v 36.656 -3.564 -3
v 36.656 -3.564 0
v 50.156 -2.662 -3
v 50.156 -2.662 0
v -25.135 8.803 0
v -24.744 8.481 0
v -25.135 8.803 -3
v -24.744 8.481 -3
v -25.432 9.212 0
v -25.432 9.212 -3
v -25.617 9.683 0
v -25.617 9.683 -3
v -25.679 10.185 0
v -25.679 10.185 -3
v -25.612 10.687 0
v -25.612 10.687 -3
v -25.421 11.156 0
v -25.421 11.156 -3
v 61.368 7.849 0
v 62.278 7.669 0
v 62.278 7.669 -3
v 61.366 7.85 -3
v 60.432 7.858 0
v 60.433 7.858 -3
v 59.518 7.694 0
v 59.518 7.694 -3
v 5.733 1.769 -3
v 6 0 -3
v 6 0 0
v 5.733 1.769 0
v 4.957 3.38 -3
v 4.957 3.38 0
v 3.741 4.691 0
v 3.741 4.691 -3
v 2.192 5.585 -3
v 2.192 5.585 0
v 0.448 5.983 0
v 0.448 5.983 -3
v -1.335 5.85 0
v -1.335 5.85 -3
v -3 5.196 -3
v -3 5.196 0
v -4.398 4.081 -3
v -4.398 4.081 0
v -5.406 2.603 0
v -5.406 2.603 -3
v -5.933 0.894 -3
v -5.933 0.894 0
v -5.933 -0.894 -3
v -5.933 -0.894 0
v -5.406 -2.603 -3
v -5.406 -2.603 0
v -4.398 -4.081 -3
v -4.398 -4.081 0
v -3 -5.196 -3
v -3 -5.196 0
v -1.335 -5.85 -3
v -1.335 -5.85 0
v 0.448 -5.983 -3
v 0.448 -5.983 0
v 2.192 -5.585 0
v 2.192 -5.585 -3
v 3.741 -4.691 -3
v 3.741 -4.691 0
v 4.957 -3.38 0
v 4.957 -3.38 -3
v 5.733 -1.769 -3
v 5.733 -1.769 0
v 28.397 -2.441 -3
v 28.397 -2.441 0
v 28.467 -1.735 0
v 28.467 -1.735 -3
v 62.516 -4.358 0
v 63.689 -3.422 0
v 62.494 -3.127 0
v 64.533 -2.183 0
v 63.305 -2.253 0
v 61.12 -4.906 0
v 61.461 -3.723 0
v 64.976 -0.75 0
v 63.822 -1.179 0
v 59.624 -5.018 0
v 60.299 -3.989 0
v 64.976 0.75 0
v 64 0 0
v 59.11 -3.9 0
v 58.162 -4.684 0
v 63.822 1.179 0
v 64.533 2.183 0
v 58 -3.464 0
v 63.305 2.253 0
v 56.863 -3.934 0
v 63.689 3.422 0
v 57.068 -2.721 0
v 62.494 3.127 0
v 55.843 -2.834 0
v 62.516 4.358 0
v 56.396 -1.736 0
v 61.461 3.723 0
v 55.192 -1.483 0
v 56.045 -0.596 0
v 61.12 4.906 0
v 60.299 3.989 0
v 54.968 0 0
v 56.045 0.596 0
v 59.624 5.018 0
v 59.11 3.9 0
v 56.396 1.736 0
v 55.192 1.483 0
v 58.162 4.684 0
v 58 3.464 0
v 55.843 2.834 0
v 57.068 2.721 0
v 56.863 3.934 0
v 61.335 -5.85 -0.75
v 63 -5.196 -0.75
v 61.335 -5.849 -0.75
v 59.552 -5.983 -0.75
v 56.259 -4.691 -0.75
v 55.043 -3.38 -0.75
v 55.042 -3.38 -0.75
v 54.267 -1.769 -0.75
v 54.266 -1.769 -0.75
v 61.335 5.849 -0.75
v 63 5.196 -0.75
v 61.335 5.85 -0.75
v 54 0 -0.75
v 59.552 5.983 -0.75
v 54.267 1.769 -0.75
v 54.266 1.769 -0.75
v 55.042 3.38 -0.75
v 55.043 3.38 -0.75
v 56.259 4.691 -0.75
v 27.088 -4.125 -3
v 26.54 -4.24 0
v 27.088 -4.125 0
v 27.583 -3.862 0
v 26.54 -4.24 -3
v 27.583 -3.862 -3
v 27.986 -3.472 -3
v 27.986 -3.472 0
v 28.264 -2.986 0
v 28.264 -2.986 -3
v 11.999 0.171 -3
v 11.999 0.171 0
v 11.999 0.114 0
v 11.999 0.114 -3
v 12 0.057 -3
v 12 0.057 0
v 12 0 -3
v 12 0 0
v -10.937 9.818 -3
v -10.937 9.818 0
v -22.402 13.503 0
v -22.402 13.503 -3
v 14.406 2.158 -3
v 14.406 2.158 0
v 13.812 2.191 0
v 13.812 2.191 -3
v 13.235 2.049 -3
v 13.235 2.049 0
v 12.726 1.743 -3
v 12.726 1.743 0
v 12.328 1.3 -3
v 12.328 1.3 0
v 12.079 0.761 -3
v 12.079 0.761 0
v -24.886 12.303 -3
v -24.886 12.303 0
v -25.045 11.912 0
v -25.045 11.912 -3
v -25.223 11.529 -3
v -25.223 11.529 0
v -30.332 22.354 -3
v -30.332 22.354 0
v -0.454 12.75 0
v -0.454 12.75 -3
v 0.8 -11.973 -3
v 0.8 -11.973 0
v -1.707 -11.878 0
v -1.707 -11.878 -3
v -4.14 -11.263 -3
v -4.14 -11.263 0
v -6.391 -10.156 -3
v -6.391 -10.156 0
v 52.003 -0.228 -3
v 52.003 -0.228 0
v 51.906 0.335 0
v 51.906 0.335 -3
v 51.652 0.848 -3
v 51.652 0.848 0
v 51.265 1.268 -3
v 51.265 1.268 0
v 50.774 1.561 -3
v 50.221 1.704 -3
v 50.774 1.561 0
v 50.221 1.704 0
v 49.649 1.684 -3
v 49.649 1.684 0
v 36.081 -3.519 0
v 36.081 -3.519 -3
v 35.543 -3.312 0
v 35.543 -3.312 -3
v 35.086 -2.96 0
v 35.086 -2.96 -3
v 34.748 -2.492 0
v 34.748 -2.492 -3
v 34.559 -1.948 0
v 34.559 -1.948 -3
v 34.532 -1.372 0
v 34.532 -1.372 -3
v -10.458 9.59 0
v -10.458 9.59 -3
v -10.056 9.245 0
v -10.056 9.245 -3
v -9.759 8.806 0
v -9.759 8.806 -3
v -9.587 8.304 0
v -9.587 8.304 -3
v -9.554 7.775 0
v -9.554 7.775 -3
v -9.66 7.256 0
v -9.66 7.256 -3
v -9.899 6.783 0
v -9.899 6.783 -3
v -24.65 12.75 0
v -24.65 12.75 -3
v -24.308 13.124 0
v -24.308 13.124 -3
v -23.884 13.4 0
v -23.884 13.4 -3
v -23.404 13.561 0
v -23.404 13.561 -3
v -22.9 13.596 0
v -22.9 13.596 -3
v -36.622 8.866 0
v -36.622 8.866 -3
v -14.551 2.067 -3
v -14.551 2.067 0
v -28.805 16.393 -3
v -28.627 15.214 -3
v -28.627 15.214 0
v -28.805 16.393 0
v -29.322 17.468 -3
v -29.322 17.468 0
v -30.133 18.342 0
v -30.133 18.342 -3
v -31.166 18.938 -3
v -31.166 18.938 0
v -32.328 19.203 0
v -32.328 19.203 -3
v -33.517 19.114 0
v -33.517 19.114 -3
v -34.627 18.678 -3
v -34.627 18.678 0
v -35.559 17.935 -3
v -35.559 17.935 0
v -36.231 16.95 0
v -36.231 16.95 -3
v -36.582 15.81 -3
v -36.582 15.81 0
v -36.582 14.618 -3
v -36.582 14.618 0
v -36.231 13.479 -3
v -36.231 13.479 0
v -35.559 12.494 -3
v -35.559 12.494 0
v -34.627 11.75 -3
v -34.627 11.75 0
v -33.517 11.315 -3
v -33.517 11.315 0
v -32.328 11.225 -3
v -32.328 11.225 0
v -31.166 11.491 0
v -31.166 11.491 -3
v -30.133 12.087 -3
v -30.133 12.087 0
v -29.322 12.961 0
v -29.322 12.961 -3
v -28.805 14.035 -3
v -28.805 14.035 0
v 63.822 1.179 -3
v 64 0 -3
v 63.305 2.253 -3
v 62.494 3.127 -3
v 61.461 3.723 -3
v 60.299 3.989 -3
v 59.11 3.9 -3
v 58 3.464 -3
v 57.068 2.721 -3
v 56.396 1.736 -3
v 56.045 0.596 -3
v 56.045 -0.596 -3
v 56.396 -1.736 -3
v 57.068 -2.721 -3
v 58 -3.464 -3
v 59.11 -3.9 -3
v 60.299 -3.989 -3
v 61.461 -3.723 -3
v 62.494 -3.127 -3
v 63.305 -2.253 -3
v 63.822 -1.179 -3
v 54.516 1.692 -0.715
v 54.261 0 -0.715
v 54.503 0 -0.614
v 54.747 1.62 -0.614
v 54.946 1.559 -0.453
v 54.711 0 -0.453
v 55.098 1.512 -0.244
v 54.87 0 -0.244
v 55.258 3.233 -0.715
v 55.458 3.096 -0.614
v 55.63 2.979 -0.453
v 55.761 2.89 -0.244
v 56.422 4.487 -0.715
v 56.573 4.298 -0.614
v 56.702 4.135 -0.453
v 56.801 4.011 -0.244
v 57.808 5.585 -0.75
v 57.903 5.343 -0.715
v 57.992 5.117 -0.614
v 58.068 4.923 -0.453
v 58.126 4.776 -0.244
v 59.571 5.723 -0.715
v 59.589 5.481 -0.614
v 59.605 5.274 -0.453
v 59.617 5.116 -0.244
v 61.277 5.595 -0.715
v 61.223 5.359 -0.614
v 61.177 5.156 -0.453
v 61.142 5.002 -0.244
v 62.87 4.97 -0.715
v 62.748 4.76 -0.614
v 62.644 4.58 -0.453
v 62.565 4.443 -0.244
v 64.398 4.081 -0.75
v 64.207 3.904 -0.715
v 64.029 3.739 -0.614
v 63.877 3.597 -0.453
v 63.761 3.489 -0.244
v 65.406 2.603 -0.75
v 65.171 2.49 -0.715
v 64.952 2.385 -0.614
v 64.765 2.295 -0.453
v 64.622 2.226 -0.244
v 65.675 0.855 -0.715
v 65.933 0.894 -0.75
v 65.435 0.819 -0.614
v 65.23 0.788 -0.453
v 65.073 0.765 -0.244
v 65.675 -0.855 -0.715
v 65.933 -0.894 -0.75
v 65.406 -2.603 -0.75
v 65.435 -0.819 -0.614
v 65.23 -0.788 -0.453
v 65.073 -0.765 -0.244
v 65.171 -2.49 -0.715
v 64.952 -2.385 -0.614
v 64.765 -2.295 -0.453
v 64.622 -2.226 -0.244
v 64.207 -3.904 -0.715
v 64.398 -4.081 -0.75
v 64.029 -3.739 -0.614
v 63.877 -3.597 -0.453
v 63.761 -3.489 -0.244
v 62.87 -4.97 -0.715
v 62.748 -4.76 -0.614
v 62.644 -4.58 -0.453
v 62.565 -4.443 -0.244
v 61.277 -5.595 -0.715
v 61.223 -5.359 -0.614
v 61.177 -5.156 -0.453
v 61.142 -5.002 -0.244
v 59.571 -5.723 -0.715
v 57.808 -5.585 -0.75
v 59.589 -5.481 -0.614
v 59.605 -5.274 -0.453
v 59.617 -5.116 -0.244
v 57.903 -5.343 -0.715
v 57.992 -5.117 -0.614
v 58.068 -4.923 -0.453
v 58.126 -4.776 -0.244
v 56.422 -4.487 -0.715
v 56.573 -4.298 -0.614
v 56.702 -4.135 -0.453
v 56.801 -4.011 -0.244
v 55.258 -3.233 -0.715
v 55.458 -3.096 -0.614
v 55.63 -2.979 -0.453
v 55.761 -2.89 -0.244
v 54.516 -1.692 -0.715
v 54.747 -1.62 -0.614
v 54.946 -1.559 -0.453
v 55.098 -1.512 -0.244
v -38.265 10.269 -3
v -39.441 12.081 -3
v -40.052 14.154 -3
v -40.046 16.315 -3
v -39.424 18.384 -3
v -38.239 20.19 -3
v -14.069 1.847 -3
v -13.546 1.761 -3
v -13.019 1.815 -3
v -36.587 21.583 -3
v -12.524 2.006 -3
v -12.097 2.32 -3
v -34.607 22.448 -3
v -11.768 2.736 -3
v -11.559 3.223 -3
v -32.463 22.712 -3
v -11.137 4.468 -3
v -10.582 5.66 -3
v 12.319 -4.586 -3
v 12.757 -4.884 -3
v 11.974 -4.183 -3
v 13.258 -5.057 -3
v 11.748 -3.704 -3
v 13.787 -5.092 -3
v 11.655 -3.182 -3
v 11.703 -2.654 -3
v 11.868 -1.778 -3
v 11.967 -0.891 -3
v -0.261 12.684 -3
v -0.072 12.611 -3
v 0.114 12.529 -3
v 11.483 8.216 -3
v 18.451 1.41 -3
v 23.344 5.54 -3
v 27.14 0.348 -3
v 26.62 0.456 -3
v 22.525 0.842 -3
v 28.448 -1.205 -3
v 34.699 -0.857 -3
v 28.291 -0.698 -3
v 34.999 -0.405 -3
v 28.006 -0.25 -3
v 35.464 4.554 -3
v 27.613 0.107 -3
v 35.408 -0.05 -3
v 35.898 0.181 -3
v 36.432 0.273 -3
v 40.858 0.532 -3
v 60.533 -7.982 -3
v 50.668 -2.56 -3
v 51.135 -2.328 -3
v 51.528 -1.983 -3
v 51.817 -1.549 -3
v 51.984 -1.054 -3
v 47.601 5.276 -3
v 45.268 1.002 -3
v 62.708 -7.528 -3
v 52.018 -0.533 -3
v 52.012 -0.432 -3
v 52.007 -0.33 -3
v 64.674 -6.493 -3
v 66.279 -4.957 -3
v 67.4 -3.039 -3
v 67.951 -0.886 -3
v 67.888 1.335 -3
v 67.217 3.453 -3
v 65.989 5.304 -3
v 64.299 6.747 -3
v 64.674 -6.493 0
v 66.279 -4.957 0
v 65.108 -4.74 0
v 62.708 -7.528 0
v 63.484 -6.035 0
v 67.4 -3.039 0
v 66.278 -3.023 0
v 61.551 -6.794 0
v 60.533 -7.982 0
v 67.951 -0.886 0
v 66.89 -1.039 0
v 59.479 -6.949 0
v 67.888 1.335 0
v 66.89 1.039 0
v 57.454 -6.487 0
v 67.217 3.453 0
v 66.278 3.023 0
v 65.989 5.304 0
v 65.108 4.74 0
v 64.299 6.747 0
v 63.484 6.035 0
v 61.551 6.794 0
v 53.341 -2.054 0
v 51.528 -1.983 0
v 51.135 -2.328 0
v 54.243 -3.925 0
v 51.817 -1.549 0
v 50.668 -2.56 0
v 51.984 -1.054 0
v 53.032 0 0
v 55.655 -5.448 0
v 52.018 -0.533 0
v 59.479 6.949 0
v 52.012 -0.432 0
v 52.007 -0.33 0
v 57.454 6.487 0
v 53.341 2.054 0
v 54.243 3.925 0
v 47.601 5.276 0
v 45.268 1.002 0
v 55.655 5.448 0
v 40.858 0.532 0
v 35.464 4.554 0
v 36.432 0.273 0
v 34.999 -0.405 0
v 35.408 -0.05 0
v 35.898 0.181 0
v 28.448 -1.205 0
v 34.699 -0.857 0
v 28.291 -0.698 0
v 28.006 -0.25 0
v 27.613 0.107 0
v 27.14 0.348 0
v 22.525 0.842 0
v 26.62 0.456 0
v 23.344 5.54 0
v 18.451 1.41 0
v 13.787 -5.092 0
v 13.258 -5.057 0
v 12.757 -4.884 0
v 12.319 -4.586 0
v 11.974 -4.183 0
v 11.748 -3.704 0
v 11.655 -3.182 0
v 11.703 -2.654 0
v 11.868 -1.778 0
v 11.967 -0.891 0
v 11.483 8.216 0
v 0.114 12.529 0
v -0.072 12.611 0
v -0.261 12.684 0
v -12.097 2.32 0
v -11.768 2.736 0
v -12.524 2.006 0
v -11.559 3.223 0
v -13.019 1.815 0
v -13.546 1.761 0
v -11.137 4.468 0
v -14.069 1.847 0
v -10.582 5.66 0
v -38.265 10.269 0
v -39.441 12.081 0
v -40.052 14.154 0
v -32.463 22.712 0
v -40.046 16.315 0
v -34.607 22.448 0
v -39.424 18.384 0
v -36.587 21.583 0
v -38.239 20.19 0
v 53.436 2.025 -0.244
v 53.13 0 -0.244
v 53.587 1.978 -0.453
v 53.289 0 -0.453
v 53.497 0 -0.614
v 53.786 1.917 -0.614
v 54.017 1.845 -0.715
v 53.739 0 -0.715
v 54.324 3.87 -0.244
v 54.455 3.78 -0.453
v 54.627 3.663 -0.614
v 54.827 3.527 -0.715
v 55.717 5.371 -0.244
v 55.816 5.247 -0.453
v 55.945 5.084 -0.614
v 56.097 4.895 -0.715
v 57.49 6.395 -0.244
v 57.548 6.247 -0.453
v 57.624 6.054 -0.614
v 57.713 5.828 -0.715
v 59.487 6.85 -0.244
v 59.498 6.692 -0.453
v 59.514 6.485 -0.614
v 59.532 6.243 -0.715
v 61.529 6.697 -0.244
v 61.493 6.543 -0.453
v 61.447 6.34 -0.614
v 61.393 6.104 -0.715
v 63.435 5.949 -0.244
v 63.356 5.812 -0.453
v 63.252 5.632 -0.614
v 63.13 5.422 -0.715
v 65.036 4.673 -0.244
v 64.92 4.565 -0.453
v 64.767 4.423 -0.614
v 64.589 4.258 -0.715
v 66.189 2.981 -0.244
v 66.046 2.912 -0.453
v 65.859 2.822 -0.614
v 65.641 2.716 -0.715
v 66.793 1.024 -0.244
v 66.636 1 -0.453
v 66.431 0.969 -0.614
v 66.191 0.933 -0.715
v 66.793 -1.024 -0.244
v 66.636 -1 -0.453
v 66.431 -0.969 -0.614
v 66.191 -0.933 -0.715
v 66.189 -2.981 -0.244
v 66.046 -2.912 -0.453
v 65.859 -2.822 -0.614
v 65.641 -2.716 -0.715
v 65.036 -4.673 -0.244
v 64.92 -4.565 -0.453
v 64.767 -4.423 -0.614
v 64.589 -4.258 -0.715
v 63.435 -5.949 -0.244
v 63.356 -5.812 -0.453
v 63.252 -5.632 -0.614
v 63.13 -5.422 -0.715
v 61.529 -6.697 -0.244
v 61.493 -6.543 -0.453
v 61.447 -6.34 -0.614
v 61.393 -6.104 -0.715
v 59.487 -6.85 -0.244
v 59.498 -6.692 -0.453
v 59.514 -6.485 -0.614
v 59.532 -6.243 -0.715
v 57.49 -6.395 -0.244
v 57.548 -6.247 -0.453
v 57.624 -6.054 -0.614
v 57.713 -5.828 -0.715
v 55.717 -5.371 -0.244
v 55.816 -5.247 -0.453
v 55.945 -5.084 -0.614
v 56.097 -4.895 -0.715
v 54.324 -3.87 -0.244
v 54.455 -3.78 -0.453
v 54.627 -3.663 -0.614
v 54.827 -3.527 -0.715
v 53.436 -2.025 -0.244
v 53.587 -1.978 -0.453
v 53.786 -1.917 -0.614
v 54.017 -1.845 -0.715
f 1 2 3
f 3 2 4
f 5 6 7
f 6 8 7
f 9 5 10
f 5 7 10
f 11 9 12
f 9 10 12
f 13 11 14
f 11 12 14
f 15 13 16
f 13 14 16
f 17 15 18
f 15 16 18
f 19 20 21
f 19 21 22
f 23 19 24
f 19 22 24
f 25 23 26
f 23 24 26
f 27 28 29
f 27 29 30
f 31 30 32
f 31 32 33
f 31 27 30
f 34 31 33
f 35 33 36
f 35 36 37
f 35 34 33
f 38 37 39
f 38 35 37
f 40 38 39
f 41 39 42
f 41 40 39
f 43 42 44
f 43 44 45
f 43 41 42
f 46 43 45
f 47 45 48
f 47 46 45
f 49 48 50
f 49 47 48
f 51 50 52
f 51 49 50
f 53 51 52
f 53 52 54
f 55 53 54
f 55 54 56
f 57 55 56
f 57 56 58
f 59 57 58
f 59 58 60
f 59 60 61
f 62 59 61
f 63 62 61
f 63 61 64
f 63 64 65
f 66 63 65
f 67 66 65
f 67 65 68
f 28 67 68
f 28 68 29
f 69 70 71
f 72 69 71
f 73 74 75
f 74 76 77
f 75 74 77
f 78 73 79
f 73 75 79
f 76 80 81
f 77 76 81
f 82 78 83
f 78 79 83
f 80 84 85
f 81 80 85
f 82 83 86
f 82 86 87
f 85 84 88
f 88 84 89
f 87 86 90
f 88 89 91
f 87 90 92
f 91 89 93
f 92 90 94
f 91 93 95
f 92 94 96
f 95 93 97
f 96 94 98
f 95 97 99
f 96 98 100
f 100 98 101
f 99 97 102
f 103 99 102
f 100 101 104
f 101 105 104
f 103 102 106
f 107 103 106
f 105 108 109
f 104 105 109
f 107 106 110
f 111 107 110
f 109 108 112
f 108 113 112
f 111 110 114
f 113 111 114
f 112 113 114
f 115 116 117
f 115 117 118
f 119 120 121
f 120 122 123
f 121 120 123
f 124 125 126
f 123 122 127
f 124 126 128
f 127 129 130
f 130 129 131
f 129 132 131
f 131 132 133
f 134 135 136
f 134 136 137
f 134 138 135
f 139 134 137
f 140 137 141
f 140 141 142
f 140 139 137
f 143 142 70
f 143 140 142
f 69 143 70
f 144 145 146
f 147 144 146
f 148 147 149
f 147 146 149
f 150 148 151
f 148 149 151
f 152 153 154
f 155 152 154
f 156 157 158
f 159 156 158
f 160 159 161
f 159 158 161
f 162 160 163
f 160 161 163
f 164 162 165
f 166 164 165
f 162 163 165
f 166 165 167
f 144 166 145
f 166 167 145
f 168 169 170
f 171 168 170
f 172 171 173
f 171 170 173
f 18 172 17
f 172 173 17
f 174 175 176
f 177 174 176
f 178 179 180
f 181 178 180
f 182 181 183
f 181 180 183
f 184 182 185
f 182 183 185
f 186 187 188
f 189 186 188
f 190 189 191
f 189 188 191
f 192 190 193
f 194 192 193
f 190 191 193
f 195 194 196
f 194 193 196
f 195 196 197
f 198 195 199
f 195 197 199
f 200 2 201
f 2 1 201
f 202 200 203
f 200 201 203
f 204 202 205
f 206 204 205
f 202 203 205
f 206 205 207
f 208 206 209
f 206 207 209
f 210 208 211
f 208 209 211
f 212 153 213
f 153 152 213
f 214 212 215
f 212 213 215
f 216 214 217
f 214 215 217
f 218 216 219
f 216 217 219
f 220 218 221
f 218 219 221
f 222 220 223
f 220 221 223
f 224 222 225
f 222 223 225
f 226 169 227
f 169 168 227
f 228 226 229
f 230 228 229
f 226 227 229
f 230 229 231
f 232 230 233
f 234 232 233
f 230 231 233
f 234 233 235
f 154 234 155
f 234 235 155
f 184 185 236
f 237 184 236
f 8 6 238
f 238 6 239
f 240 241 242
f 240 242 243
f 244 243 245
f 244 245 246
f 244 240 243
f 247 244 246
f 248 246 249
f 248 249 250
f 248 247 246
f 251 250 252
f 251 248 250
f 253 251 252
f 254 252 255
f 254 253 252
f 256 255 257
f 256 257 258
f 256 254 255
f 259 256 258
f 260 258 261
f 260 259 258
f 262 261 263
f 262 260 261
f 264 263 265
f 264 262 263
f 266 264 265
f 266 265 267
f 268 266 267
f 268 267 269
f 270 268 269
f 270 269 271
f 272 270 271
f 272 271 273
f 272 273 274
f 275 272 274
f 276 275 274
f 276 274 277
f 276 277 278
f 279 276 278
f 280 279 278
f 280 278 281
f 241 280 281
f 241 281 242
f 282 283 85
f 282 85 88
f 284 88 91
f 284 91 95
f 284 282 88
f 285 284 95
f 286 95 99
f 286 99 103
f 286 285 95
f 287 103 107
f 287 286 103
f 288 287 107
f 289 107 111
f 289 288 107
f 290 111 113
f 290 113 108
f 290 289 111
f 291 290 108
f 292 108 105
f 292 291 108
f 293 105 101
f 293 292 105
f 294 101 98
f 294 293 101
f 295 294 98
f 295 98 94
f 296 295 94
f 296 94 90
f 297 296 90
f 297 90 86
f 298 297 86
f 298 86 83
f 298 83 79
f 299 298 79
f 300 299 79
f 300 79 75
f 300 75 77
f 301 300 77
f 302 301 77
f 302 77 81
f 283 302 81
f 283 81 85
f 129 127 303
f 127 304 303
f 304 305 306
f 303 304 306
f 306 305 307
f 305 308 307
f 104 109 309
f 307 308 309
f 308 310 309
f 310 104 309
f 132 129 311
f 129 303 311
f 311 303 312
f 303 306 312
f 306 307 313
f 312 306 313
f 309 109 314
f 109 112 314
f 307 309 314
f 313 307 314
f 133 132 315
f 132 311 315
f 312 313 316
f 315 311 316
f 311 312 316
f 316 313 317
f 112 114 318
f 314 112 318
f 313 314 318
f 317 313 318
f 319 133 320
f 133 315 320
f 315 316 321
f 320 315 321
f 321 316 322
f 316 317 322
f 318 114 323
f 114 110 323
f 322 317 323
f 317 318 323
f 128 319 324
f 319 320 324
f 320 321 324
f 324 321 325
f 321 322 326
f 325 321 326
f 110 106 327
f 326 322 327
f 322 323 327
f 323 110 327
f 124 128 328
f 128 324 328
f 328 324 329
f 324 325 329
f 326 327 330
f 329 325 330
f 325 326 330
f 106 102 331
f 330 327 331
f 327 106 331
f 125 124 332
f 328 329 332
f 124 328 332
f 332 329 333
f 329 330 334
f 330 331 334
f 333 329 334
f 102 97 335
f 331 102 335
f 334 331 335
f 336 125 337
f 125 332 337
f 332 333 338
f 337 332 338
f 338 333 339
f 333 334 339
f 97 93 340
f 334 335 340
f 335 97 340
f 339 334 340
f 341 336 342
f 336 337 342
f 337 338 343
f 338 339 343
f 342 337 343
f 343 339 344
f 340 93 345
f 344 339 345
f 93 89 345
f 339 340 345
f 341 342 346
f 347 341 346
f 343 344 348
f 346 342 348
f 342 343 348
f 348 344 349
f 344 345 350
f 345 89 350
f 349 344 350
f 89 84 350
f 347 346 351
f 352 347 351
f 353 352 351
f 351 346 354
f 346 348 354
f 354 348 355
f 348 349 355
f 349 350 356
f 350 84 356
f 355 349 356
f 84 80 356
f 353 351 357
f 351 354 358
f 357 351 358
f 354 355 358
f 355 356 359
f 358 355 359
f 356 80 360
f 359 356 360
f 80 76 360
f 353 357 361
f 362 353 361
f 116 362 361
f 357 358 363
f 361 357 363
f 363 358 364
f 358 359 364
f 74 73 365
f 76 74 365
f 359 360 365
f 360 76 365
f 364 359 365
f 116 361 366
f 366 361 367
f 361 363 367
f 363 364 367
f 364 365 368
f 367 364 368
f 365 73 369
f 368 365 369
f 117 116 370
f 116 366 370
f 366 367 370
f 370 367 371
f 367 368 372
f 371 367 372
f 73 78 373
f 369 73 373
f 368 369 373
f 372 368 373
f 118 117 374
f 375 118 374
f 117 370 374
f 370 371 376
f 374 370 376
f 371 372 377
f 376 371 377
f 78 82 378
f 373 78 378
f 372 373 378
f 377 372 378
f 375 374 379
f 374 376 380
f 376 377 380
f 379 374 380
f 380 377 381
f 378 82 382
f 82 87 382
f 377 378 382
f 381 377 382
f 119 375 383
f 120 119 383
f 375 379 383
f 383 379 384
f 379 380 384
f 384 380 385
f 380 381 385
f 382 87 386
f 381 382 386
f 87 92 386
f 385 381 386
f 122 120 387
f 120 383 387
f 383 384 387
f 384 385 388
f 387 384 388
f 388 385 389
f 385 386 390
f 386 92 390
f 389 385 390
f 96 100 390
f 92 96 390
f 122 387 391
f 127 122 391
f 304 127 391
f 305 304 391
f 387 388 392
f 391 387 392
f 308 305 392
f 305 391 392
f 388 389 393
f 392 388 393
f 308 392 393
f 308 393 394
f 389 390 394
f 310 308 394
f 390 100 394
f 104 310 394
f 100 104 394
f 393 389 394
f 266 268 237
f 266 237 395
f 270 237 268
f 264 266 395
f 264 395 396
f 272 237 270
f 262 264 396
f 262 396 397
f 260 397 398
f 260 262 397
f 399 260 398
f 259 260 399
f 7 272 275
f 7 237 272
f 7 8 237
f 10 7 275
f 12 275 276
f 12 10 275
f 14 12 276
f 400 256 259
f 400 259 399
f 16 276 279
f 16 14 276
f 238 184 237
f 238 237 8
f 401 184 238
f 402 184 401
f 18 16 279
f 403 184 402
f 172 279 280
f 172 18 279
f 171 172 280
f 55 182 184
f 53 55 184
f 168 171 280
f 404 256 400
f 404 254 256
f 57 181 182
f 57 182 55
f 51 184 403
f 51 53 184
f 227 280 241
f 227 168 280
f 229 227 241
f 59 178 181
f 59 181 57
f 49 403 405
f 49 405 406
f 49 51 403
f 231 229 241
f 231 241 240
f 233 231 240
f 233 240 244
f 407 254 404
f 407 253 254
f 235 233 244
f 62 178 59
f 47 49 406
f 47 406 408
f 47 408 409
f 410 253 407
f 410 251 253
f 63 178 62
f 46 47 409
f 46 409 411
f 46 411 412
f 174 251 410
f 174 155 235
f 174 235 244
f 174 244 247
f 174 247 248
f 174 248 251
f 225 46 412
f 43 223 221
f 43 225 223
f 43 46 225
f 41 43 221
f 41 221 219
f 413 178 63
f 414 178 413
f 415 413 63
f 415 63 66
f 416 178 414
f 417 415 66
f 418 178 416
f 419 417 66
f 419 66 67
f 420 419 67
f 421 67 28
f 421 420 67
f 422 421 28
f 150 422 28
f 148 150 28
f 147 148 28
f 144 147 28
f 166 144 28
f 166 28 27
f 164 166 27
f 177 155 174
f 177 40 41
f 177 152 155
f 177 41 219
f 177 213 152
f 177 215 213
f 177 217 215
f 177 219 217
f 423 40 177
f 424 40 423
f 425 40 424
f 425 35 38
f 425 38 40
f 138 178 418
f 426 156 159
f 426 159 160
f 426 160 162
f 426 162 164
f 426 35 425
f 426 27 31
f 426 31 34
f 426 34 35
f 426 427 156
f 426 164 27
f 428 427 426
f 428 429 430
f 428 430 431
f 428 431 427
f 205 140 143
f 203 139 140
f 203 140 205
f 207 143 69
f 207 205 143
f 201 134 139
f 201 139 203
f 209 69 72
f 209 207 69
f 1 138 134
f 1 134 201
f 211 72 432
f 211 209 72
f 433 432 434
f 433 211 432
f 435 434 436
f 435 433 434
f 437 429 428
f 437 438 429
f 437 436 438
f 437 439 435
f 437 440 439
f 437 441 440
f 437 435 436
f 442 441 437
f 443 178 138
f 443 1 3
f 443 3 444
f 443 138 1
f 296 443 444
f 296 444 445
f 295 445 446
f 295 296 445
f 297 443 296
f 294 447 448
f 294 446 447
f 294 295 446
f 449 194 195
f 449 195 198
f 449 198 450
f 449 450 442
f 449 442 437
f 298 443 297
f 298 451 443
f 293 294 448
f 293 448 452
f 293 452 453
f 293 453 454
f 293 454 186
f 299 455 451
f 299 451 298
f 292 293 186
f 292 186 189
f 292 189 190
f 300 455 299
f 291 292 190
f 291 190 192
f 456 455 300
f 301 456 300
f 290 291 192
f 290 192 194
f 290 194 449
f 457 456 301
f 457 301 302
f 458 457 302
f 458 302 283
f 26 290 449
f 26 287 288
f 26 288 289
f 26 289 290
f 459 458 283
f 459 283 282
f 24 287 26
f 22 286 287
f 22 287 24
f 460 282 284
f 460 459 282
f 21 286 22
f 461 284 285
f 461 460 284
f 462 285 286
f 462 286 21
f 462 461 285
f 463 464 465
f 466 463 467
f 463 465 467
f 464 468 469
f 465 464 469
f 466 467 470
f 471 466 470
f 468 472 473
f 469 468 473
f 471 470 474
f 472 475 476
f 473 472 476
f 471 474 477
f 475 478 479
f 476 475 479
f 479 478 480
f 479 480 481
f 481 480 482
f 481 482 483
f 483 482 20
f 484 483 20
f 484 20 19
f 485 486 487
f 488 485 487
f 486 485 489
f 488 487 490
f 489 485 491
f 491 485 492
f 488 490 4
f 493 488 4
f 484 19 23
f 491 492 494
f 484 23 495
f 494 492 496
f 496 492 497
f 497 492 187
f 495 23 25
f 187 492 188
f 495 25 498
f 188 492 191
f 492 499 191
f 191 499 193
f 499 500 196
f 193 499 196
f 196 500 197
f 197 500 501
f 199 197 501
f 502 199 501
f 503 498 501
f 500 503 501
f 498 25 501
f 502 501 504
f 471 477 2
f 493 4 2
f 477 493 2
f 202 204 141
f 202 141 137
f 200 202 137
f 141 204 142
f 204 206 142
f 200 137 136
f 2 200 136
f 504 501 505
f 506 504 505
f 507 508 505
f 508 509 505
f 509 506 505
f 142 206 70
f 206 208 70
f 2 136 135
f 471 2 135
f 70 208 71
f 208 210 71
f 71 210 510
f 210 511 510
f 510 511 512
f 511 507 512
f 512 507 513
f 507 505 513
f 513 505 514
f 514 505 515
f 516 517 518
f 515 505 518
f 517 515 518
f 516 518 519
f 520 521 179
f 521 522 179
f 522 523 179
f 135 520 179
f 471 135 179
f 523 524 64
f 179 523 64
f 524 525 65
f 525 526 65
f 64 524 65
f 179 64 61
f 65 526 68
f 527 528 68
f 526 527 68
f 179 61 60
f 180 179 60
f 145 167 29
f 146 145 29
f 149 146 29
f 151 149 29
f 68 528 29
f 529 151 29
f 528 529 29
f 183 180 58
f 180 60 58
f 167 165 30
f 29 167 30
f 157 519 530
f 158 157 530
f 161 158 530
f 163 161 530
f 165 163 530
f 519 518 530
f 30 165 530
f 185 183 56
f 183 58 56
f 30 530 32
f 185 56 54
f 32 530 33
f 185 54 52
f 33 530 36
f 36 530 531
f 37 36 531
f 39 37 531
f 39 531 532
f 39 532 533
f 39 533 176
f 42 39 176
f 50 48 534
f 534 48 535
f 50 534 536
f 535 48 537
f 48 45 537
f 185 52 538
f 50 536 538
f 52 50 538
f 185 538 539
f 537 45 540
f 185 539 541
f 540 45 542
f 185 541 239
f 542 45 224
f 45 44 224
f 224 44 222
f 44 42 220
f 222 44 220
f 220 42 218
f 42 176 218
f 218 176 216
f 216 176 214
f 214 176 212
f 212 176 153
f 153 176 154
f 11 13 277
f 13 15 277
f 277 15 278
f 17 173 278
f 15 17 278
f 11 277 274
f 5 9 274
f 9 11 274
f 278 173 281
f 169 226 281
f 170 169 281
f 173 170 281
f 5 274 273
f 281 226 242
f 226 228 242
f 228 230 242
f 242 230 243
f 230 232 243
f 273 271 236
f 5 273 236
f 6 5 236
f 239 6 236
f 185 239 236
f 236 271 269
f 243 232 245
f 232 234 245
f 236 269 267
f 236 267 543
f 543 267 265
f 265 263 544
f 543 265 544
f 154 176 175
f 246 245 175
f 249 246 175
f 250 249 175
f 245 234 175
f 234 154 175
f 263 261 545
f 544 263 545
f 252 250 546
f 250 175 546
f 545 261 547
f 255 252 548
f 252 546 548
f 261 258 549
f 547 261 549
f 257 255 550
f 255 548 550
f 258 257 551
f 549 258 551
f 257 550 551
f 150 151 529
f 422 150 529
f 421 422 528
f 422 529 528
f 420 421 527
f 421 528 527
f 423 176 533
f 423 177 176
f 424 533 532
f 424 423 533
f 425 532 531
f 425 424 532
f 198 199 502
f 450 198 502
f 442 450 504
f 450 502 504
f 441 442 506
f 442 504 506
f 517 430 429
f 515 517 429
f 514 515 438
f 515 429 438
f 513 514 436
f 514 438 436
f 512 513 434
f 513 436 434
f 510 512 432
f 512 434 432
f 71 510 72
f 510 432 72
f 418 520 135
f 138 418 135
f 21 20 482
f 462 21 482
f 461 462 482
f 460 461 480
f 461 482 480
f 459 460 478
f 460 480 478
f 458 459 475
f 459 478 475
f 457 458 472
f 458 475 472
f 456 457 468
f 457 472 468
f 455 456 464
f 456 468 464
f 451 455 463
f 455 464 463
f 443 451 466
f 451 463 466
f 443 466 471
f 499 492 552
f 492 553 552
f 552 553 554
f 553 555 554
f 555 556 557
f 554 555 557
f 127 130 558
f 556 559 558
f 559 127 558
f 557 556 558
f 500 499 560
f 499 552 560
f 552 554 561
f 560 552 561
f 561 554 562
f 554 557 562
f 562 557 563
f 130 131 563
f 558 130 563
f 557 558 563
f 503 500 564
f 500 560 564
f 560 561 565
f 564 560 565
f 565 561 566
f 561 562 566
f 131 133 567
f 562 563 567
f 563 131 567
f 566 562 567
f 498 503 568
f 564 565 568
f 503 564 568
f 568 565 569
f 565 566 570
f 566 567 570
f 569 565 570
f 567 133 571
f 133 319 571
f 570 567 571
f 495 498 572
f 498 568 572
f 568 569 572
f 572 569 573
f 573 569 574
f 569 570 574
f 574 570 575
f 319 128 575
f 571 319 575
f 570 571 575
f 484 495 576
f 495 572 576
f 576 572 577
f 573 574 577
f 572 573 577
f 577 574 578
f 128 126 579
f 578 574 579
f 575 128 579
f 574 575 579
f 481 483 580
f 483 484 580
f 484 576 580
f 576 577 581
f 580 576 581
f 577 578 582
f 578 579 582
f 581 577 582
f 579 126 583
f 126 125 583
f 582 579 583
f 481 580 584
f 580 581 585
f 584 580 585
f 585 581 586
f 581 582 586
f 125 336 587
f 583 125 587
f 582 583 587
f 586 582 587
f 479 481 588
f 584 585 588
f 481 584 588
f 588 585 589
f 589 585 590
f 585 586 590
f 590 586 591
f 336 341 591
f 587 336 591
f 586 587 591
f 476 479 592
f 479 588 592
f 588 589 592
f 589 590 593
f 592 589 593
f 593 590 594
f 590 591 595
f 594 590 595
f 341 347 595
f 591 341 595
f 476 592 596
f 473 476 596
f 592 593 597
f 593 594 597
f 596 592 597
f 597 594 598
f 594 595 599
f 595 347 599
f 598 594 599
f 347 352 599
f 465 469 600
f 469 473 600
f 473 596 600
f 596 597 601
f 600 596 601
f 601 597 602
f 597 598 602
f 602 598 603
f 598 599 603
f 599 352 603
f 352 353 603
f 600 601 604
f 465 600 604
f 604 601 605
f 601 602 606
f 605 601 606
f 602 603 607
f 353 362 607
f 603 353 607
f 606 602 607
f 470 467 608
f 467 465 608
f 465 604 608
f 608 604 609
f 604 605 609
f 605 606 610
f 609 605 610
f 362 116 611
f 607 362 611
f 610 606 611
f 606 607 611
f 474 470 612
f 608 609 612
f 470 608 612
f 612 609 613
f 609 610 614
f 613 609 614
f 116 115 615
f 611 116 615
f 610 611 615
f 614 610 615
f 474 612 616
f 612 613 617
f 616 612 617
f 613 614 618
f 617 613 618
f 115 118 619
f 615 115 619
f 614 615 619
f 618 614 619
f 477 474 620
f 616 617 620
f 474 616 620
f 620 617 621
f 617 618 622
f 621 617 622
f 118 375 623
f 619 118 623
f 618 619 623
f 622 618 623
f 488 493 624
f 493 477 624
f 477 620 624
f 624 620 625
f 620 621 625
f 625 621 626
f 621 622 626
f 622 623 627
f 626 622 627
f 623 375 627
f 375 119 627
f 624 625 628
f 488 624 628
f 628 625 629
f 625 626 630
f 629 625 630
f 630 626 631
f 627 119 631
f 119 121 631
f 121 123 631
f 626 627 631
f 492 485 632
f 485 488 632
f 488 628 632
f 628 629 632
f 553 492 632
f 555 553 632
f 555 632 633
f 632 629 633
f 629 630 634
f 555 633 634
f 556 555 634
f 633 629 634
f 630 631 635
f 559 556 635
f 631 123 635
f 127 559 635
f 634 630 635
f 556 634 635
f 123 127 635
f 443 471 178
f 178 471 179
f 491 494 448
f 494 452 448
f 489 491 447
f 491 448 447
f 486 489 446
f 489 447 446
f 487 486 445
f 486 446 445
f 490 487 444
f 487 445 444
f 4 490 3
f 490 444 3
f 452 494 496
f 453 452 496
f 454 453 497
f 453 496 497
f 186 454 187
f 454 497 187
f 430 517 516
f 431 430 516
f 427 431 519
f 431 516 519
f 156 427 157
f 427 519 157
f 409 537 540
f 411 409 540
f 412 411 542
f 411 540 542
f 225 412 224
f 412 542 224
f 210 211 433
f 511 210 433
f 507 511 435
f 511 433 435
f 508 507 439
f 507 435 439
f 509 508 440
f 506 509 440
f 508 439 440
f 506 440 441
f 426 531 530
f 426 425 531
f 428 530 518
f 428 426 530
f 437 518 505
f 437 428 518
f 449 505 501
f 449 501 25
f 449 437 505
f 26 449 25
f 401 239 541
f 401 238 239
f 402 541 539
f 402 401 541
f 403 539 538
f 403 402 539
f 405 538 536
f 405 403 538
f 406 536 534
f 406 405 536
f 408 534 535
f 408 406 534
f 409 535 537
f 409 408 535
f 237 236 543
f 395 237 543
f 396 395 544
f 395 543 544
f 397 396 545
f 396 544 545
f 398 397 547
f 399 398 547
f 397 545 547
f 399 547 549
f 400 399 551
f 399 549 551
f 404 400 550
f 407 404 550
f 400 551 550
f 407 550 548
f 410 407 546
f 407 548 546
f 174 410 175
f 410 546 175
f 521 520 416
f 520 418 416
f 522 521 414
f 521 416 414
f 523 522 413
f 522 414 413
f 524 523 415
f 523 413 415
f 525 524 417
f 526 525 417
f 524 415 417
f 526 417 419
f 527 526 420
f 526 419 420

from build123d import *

# Parameters (mm, degrees)
EXTRUDE_1_DEPTH     = 3
SKETCH_2_R          = 4
SKETCH_2_R_2        = 6
CUT_EXTRUDE_1_DEPTH = 5
CUT_EXTRUDE_START   = -10
CUT_EXTRUDE_2_DEPTH = 10
FILLET_1_R          = 2
EXTRUDE_START       = -3
EXTRUDE_2_DEPTH     = 3
FILLET_3_R          = 2
EXTRUDE_START_2     = 0.25
SKETCH_6_R          = 8
EXTRUDE_3_DEPTH     = 0.25
SKETCH_7_R          = 7
SKETCH_7_R_2        = 5
CUT_EXTRUDE_4_DEPTH = 1
SKETCH_4_R          = 86.502313977
CUT_EXTRUDE_5_DEPTH = 11
FILLET_5_R          = 5
FILLET_6_R          = 1
SKETCH_8_R          = 14.07038583
CUT_EXTRUDE_6_DEPTH = 0.25


# Some blends are built 0.0001 mm under size
with BuildPart() as part:
    # 草图1 → 凸台-拉伸1 (new body)
    with BuildSketch(Plane.XY):
        with BuildLine():
            Line((60.533333333, -7.982202425), (0.8, -11.973303638))
            ThreePointArc((0.8, -11.973303638), (-2.939445104, -11.634417153), (-6.391104371, -10.156465178))
            Line((-6.391104371, -10.156465178), (-36.621520565, 8.866466686))
            ThreePointArc((-36.621520565, 8.866466686), (-39.424388736, 18.383894386), (-30.331967202, 22.3544574))
            Line((-30.331967202, 22.3544574), (-0.067539503, 12.626398572))
            ThreePointArc((-0.067539503, 12.626398572), (2.297970236, 12.022555106), (4.719428847, 11.711425782))
            Line((4.719428847, 11.711425782), (60.533333333, 7.982202425))
            ThreePointArc((60.533333333, 7.982202425), (68, 0), (60.533333333, -7.982202425))
        make_face()
    extrude(amount=EXTRUDE_1_DEPTH)

    # 草图2 → 切除-拉伸1 (cut)
    with BuildSketch(Plane.XY.offset(3)):
        with Locations((-32.627080333, 15.214257423)):
            Circle(SKETCH_2_R)
        with Locations((60, 0)):
            Circle(SKETCH_2_R)
        Circle(SKETCH_2_R_2)
    extrude(amount=-CUT_EXTRUDE_1_DEPTH, mode=Mode.SUBTRACT)

    # 草图3 → 切除-拉伸2 (cut)
    with BuildSketch(Plane.XY.offset(3).offset(CUT_EXTRUDE_START)):
        with BuildLine():
            Line((28.230392562, -4.127155499), (29.041000535, 4.072994476))
            Line((29.041000535, 4.072994476), (10.769185117, 5.293831496))
            ThreePointArc((10.769185117, 5.293831496), (11.688246691, 2.71751528), (12, 0))
            ThreePointArc((12, 0), (11.688246691, -2.71751528), (10.769185117, -5.293831496))
            Line((10.769185117, -5.293831496), (28.230392562, -4.127155499))
        make_face()
        with BuildLine():
            ThreePointArc((-11.991309043, 0.456626154), (-10.875693444, 5.071419141), (-8.057660805, 8.892362024))
            Line((-8.057660805, 8.892362024), (-24.425138032, 14.153448832))
            ThreePointArc((-24.425138032, 14.153448832), (-25.131680833, 11.719095235), (-26.54234692, 9.613079718))
            Line((-26.54234692, 9.613079718), (-11.991309043, 0.456626154))
        make_face()
        with BuildLine():
            Line((52.404599069, 2.511948386), (35.030683756, 3.672791932))
            Line((35.030683756, 3.672791932), (34.299724154, -3.721631224))
            Line((34.299724154, -3.721631224), (52.404599069, -2.511948386))
            ThreePointArc((52.404599069, -2.511948386), (52, 0), (52.404599069, 2.511948386))
        make_face()
    extrude(amount=CUT_EXTRUDE_2_DEPTH, mode=Mode.SUBTRACT)

    # 圆角1
    fillet_1_edges = [part.edges().sort_by_distance(p)[0] for p in [
        (52.404599069, 2.511948386, 1.5),
        (52.404599069, -2.511948386, 1.5),
        (34.299724154, -3.721631224, 1.5),
        (35.030683756, 3.672791932, 1.5),
        (-26.54234692, 9.613079718, 1.5),
        (-24.425138032, 14.153448832, 1.5),
        (-8.057660805, 8.892362024, 1.5),
        (-11.991309043, 0.456626154, 1.5),
        (10.769185117, -5.293831496, 1.5),
        (10.769185117, 5.293831496, 1.5),
        (29.041000535, 4.072994476, 1.5),
        (28.230392562, -4.127155499, 1.5),
    ]]
    fillet(fillet_1_edges, radius=FILLET_1_R)

    # 草图5 → 凸台-拉伸2 (add)
    with BuildSketch(Plane.XY.offset(3).offset(EXTRUDE_START)):
        with BuildLine():
            Line((-24.540394024, 20.492840682), (-0.067539503, 12.626398572))
            ThreePointArc((-0.067539503, 12.626398572), (29.515306686, 4.823317954), (59.944614351, 7.999808275))
            ThreePointArc((59.944614351, 7.999808275), (62.829825639, 7.482786036), (65.335143615, 5.96122828))
            ThreePointArc((65.335143615, 5.96122828), (18.485789408, 1.404205763), (-24.540394024, 20.492840682))
        make_face()
    extrude(amount=EXTRUDE_2_DEPTH)

    # 圆角3
    # the kernel refuses this fillet: 2 mm, written as the material it adds along each edge
    with BuildSketch(Plane(origin=(51.482720464, 2.033055033, 0), x_dir=(-0.982319810641478, -0.18721054890494518, 0), z_dir=(0, 0, 1))) as fillet_3_piece_1:
        with BuildLine():
            CenterArc((1.886422925, 1.999898233), FILLET_3_R, 170.841064361, 98.580936146)
            Line((-0.088078274, 2.318245549), (-0.285528394, 2.350080281))
            ThreePointArc((-0.285528394, 2.350080281), (-0.438383872, 1.623834826), (-0.169045436, -0.106881432))
            Line((-0.169045436, -0.106881432), (0.002017565, -0.199989823))
            ThreePointArc((0.002017565, -0.199989823), (0.933123639, -0.195293287), (1.864229714, -0.199989823))
            Line((1.864229714, -0.199989823), (1.866247279, 0))
        make_face()
    extrude(amount=3)
    with BuildSketch(Plane(origin=(34.690308342, 0.229537561, 3), x_dir=(-0.09837334507512366, -0.995149579198389, 0), z_dir=(0, 0, -1))) as fillet_3_piece_2:
        with BuildLine():
            CenterArc((1.767742063, -1.99371148), FILLET_3_R, 94.544757631, 77.838582335)
            Line((-0.214612021, -1.728622274), (-0.254259103, -1.72332049))
            ThreePointArc((-0.254259103, -1.72332049), (-0.142932142, -0.859888079), (-0.039739887, 0.004554272))
            Line((-0.039739887, 0.004554272), (0, 0.04))
            ThreePointArc((0, 0.04), (0.8046332, 0.04), (1.606096886, 0.03987423))
            Line((1.606096886, 0.03987423), (1.6092664, 0))
        make_face()
    extrude(amount=3)
    with BuildSketch(Plane(origin=(28.671165111, 0.331721205, 3), x_dir=(-0.9981625762582289, 0.060592667522857975, 0), z_dir=(0, 0, -1))) as fillet_3_piece_3:
        with BuildLine():
            CenterArc((2.077274931, -1.999876599), FILLET_3_R, 90.636478793, 91.535197335)
            Line((0.078711388, -2.075664247), (0.038740118, -2.07718))
            Line((0.038740118, -2.07718), (-0.039971271, -0.001515753))
            Line((-0.039971271, -0.001515753), (0.000444337, 0.039997532))
            ThreePointArc((0.000444337, 0.039997532), (1.027529043, 0.034292711), (2.05461375, 0.039997532))
            Line((2.05461375, 0.039997532), (2.055058086, 0))
        make_face()
    extrude(amount=3)
    with BuildSketch(Plane(origin=(11.680363127, 2.768333075, 0), x_dir=(0.12170231269855974, -0.9925666461673099, 0), z_dir=(0, 0, 1))) as fillet_3_piece_4:
        with BuildLine():
            CenterArc((2.831331682, 1.988408565), FILLET_3_R, 161.255131194, 102.573219996)
            Line((0.937413857, 2.631117886), (0.748022074, 2.695388818))
            ThreePointArc((0.748022074, 2.695388818), (0.290238781, 1.379143519), (-0.187364942, 0.069959836))
            Line((-0.187364942, 0.069959836), (0.008579816, -0.199815882))
            ThreePointArc((0.008579816, -0.199815882), (0.136091641, -0.190622784), (2.594815369, -0.198840857))
            Line((2.594815369, -0.198840857), (2.616316852, 0))
        make_face()
    extrude(amount=3)

    # 草图6 → 凸台-拉伸3 (add)
    with BuildSketch(Plane(origin=(0, 0, 0), x_dir=(-1, 0, 0), z_dir=(0, 0, -1)).offset(EXTRUDE_START_2)):
        with Locations((-60, 0)):
            Circle(SKETCH_6_R)
    extrude(amount=-EXTRUDE_3_DEPTH)

    # 草图7 → 切除-拉伸4 (cut)
    with BuildSketch(Plane(origin=(0, 0, -0.25), x_dir=(-1, 0, 0), z_dir=(0, 0, -1))):
        with Locations((-60, 0)):
            Circle(SKETCH_7_R)
        with Locations((-60, 0)):
            Circle(SKETCH_7_R_2, mode=Mode.SUBTRACT)
    extrude(amount=-CUT_EXTRUDE_4_DEPTH, mode=Mode.SUBTRACT)

    # 草图4 → 切除-拉伸5 (cut)
    with BuildSketch(Plane.XY.offset(3)):
        with Locations((36.403919295, 91.050979361)):
            Circle(SKETCH_4_R)
    extrude(amount=-CUT_EXTRUDE_5_DEPTH, mode=Mode.SUBTRACT)

    # 圆角5
    fillet_5_edges = [part.edges().sort_by_distance(p)[0] for p in [
        (60.533333333, 7.982202425, 1.375),
        (-0.158941589, 12.65577844, 1.5),
    ]]
    fillet(fillet_5_edges, radius=FILLET_5_R)

    # 圆角6
    fillet_6_edges = [part.edges().sort_by_distance(p)[0] for p in [
        (67, 0, 0.75),
        (65, 0, 0.75),
    ]]
    fillet(fillet_6_edges, radius=FILLET_6_R - 0.0001)  # a hair under: the kernel refuses the full size

    # 草图8 → 切除-拉伸6 (cut)
    with BuildSketch(Plane(origin=(0, 0, -0.25), x_dir=(-1, 0, 0), z_dir=(0, 0, -1))):
        with Locations((-60, 0)):
            Circle(SKETCH_8_R)
    extrude(amount=-CUT_EXTRUDE_6_DEPTH, mode=Mode.SUBTRACT)


with BuildPart() as body_2:
    # 镜向1: mirrored copy
    add(part.part.mirror(Plane.XY))


solid = body_2.part
